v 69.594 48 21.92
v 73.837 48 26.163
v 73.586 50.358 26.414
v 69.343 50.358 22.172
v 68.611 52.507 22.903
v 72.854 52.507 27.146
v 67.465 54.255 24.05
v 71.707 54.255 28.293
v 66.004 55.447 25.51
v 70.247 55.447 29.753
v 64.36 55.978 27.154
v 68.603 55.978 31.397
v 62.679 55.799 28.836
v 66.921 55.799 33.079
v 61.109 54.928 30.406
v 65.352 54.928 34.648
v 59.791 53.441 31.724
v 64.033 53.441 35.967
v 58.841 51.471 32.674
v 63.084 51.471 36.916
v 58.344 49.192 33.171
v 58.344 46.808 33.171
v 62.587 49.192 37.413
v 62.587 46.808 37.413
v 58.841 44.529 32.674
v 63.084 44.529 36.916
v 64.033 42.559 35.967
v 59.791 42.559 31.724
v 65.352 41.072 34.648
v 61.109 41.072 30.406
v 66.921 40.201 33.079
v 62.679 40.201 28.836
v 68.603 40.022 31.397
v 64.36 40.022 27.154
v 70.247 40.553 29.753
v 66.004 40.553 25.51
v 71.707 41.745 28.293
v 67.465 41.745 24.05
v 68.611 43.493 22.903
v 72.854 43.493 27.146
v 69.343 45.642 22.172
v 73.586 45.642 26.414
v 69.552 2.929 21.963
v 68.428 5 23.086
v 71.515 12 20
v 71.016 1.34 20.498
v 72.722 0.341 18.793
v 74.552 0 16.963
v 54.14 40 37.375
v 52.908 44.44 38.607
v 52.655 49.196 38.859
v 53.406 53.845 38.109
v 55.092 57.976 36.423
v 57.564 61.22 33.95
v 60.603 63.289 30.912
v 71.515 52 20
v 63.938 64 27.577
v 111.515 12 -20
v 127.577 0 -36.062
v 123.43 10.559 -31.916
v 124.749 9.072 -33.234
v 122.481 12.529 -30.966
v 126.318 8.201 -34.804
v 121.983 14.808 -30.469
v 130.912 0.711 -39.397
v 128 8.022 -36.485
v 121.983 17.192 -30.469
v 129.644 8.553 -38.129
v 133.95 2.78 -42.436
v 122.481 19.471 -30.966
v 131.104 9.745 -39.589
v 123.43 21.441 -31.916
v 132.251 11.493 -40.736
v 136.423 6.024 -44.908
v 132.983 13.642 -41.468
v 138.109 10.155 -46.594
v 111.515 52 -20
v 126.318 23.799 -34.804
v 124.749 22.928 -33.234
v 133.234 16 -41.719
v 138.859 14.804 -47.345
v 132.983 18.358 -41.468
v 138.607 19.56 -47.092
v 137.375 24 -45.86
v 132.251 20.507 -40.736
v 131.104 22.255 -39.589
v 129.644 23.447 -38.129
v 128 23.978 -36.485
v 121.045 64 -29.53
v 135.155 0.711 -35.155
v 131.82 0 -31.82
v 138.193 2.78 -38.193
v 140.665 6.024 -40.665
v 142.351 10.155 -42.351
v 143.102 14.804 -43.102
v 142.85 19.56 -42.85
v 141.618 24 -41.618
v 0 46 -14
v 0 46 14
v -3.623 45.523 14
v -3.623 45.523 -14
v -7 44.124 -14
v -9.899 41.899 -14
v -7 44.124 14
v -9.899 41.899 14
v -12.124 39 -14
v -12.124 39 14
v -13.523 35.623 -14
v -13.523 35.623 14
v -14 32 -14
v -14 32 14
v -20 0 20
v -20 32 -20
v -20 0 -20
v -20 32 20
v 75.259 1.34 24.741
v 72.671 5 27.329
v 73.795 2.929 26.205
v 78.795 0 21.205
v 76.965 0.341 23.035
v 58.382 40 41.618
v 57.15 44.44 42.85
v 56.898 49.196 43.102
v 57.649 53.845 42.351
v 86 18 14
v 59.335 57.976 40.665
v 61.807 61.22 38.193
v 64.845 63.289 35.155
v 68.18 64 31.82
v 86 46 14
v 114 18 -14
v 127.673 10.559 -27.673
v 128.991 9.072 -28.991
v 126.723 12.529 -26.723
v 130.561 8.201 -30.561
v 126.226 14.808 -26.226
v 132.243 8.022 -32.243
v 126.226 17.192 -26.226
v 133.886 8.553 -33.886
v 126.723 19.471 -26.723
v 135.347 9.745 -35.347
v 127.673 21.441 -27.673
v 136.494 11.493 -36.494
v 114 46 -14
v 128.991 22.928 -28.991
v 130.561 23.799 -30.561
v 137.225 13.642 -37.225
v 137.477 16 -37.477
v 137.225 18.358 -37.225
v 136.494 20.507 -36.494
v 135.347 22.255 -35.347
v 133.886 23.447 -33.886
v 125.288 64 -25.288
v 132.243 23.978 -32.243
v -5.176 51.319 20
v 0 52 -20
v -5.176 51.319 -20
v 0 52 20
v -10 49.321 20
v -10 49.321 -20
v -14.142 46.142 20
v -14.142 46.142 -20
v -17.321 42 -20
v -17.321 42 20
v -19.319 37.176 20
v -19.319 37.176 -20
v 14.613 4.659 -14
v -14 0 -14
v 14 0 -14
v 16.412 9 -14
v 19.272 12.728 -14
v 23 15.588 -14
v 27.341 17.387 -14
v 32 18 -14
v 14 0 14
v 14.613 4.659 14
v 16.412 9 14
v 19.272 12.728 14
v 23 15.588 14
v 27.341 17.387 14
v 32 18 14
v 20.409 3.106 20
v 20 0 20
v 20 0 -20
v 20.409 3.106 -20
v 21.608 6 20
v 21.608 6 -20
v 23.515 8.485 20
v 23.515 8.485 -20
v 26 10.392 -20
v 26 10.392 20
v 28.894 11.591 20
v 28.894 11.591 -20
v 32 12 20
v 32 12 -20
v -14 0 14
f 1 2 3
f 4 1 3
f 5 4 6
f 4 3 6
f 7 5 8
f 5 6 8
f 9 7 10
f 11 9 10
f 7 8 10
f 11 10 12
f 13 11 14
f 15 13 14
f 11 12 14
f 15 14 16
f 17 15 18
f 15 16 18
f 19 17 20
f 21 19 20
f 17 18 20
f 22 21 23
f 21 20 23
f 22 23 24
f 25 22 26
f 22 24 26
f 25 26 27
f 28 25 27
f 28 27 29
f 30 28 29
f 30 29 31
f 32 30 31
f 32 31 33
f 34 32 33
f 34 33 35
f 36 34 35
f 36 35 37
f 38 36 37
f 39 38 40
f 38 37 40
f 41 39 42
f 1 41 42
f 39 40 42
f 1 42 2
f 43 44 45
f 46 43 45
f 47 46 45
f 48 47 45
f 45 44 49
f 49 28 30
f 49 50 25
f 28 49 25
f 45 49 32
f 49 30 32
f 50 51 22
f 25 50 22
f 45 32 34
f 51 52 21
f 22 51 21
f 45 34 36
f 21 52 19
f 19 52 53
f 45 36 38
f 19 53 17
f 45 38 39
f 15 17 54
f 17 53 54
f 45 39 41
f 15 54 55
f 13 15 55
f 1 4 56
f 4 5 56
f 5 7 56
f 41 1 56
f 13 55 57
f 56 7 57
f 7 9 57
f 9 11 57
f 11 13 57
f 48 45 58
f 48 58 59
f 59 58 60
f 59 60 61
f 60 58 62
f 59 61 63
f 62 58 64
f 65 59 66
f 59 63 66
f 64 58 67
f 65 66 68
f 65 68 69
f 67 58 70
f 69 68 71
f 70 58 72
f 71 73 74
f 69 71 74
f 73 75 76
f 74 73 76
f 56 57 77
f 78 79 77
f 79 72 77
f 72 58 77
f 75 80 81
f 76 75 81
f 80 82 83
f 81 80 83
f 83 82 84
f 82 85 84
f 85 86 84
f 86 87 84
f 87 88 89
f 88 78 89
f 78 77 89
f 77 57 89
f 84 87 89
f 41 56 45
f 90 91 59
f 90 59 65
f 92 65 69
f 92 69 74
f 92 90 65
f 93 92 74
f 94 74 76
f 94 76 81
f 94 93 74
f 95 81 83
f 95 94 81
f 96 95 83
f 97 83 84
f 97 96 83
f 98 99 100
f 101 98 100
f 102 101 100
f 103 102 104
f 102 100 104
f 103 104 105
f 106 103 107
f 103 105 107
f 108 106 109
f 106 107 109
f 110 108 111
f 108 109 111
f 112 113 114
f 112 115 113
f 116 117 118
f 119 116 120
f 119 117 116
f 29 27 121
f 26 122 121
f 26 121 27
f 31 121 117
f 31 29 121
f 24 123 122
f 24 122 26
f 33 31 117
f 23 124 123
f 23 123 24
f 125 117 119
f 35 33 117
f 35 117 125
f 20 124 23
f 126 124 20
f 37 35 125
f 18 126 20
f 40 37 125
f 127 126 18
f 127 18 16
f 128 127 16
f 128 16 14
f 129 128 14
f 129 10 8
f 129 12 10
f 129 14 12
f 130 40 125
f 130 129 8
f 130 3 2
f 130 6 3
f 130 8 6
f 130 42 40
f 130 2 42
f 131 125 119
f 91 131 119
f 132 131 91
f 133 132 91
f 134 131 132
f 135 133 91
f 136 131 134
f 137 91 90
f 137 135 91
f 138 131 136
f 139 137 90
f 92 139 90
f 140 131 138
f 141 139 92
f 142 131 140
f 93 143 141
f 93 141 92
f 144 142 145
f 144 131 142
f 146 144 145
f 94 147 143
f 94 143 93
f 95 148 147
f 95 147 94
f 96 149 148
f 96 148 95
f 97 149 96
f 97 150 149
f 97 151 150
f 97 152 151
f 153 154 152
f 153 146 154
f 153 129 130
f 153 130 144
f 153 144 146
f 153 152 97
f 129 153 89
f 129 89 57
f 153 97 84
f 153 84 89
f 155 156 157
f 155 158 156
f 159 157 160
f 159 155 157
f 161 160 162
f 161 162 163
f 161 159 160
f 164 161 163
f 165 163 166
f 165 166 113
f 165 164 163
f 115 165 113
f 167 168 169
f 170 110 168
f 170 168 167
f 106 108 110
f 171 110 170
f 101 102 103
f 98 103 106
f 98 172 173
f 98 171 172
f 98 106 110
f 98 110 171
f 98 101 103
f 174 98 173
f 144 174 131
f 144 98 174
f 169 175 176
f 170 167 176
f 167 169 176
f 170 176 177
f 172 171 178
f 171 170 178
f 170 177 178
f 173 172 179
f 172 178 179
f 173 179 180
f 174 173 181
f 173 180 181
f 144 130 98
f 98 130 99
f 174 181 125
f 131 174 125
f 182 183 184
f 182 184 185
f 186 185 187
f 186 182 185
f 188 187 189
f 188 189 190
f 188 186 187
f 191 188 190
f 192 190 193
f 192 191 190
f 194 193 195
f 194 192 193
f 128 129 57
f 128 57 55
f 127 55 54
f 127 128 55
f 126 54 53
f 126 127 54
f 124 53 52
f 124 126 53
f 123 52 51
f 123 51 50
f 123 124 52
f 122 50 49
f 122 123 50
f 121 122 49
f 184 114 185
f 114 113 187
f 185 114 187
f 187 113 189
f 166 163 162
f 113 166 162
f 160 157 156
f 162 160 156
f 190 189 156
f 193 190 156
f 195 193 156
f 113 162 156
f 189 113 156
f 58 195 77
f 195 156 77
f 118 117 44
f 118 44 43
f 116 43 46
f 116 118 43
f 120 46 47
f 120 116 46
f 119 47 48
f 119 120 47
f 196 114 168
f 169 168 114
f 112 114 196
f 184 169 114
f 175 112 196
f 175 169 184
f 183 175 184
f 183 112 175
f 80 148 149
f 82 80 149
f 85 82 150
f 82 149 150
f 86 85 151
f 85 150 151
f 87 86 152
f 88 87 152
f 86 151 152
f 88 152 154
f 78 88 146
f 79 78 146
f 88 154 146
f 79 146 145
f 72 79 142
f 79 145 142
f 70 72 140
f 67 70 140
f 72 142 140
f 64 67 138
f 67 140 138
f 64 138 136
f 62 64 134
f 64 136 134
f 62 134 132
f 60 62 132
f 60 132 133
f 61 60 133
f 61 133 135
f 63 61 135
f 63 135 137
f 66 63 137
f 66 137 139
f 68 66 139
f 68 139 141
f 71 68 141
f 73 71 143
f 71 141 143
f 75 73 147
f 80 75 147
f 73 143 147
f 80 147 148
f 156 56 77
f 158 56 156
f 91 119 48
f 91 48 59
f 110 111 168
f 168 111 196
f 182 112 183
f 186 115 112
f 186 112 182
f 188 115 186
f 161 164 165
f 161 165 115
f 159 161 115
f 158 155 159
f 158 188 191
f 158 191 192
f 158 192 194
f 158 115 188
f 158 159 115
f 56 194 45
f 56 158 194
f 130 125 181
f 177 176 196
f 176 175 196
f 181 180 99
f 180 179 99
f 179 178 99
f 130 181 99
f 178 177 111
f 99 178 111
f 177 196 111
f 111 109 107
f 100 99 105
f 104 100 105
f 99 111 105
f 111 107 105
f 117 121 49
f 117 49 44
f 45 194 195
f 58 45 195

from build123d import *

# Parameters (mm, degrees)
F1_DEPTH = 20
F2_T     = -6
F4_DEPTH = 40.001
F5_R     = 8
F5_W     = 39.5979797464
F5_H     = 28
F6_DEPTH = 6
F7_W     = 28
F7_H     = 28
F8_DEPTH = 143.1345136524


with BuildPart() as f1:
    # F0 (on Top) → F1 (new body, symmetric)
    with BuildSketch(Plane.XY):
        with BuildLine():
            Line((-20, 32), (-20, 0))
            Line((-20, 0), (20, 0))
            ThreePointArc((20, 0), (23.5147186258, 8.4852813742), (32, 12))
            Line((32, 12), (120, 12))
            Line((120, 12), (80, 52))
            Line((80, 52), (0, 52))
            ThreePointArc((0, 52), (-14.1421356237, 46.1421356237), (-20, 32))
        make_face()
        Polygon((80, 52), (120, 12), (120, 52), align=None)
    extrude(amount=F1_DEPTH, both=True)

    # F2
    f2_openings = [f1.faces().sort_by_distance(p)[0] for p in [
        (0, 0, 0),
        (120, 32, 0),
    ]]
    offset(amount=F2_T, openings=f2_openings)

    # F3 (on face) → F4 (cut, through all)
    with BuildSketch(Plane.XZ.offset(-12)):
        Polygon((80, 20), (120, -20), (120, 20), align=None)
    extrude(amount=-F4_DEPTH, mode=Mode.SUBTRACT)

    # F5 (on face) → F6 (join)
    with BuildSketch(Plane(origin=(50, 0, 50), x_dir=(0.7071067812, 0, -0.7071067812), z_dir=(0.7071067812, 0, 0.7071067812))):
        with BuildLine():
            Line((106.4730738116, 64), (25.7106781187, 64))
            ThreePointArc((25.7106781187, 64), (11.8542716581, 56), (11.8542716581, 40))
            Line((11.8542716581, 40), (32.0615310797, 5))
            ThreePointArc((32.0615310797, 5), (35.7217851176, 1.3397459622), (40.7217851176, 0))
            Line((40.7217851176, 0), (115.7106781187, 0))
            ThreePointArc((115.7106781187, 0), (129.5670845792, 8), (129.5670845792, 24))
            Line((129.5670845792, 24), (106.4730738116, 64))
        make_face()
        with Locations((115.7106781187, 16)):
            Circle(F5_R, mode=Mode.SUBTRACT)
        with Locations((25.7106781187, 48)):
            Circle(F5_R, mode=Mode.SUBTRACT)
        with Locations((70.7106781187, 32)):
            Rectangle(F5_W, F5_H, mode=Mode.SUBTRACT)
    extrude(amount=-F6_DEPTH)

    # F7 (on Right) → F8 (cut, through all)
    with BuildSketch(Plane.YZ):
        with Locations((32, 0)):
            Rectangle(F7_W, F7_H)
    extrude(amount=F8_DEPTH, mode=Mode.SUBTRACT)


solid = f1.part
